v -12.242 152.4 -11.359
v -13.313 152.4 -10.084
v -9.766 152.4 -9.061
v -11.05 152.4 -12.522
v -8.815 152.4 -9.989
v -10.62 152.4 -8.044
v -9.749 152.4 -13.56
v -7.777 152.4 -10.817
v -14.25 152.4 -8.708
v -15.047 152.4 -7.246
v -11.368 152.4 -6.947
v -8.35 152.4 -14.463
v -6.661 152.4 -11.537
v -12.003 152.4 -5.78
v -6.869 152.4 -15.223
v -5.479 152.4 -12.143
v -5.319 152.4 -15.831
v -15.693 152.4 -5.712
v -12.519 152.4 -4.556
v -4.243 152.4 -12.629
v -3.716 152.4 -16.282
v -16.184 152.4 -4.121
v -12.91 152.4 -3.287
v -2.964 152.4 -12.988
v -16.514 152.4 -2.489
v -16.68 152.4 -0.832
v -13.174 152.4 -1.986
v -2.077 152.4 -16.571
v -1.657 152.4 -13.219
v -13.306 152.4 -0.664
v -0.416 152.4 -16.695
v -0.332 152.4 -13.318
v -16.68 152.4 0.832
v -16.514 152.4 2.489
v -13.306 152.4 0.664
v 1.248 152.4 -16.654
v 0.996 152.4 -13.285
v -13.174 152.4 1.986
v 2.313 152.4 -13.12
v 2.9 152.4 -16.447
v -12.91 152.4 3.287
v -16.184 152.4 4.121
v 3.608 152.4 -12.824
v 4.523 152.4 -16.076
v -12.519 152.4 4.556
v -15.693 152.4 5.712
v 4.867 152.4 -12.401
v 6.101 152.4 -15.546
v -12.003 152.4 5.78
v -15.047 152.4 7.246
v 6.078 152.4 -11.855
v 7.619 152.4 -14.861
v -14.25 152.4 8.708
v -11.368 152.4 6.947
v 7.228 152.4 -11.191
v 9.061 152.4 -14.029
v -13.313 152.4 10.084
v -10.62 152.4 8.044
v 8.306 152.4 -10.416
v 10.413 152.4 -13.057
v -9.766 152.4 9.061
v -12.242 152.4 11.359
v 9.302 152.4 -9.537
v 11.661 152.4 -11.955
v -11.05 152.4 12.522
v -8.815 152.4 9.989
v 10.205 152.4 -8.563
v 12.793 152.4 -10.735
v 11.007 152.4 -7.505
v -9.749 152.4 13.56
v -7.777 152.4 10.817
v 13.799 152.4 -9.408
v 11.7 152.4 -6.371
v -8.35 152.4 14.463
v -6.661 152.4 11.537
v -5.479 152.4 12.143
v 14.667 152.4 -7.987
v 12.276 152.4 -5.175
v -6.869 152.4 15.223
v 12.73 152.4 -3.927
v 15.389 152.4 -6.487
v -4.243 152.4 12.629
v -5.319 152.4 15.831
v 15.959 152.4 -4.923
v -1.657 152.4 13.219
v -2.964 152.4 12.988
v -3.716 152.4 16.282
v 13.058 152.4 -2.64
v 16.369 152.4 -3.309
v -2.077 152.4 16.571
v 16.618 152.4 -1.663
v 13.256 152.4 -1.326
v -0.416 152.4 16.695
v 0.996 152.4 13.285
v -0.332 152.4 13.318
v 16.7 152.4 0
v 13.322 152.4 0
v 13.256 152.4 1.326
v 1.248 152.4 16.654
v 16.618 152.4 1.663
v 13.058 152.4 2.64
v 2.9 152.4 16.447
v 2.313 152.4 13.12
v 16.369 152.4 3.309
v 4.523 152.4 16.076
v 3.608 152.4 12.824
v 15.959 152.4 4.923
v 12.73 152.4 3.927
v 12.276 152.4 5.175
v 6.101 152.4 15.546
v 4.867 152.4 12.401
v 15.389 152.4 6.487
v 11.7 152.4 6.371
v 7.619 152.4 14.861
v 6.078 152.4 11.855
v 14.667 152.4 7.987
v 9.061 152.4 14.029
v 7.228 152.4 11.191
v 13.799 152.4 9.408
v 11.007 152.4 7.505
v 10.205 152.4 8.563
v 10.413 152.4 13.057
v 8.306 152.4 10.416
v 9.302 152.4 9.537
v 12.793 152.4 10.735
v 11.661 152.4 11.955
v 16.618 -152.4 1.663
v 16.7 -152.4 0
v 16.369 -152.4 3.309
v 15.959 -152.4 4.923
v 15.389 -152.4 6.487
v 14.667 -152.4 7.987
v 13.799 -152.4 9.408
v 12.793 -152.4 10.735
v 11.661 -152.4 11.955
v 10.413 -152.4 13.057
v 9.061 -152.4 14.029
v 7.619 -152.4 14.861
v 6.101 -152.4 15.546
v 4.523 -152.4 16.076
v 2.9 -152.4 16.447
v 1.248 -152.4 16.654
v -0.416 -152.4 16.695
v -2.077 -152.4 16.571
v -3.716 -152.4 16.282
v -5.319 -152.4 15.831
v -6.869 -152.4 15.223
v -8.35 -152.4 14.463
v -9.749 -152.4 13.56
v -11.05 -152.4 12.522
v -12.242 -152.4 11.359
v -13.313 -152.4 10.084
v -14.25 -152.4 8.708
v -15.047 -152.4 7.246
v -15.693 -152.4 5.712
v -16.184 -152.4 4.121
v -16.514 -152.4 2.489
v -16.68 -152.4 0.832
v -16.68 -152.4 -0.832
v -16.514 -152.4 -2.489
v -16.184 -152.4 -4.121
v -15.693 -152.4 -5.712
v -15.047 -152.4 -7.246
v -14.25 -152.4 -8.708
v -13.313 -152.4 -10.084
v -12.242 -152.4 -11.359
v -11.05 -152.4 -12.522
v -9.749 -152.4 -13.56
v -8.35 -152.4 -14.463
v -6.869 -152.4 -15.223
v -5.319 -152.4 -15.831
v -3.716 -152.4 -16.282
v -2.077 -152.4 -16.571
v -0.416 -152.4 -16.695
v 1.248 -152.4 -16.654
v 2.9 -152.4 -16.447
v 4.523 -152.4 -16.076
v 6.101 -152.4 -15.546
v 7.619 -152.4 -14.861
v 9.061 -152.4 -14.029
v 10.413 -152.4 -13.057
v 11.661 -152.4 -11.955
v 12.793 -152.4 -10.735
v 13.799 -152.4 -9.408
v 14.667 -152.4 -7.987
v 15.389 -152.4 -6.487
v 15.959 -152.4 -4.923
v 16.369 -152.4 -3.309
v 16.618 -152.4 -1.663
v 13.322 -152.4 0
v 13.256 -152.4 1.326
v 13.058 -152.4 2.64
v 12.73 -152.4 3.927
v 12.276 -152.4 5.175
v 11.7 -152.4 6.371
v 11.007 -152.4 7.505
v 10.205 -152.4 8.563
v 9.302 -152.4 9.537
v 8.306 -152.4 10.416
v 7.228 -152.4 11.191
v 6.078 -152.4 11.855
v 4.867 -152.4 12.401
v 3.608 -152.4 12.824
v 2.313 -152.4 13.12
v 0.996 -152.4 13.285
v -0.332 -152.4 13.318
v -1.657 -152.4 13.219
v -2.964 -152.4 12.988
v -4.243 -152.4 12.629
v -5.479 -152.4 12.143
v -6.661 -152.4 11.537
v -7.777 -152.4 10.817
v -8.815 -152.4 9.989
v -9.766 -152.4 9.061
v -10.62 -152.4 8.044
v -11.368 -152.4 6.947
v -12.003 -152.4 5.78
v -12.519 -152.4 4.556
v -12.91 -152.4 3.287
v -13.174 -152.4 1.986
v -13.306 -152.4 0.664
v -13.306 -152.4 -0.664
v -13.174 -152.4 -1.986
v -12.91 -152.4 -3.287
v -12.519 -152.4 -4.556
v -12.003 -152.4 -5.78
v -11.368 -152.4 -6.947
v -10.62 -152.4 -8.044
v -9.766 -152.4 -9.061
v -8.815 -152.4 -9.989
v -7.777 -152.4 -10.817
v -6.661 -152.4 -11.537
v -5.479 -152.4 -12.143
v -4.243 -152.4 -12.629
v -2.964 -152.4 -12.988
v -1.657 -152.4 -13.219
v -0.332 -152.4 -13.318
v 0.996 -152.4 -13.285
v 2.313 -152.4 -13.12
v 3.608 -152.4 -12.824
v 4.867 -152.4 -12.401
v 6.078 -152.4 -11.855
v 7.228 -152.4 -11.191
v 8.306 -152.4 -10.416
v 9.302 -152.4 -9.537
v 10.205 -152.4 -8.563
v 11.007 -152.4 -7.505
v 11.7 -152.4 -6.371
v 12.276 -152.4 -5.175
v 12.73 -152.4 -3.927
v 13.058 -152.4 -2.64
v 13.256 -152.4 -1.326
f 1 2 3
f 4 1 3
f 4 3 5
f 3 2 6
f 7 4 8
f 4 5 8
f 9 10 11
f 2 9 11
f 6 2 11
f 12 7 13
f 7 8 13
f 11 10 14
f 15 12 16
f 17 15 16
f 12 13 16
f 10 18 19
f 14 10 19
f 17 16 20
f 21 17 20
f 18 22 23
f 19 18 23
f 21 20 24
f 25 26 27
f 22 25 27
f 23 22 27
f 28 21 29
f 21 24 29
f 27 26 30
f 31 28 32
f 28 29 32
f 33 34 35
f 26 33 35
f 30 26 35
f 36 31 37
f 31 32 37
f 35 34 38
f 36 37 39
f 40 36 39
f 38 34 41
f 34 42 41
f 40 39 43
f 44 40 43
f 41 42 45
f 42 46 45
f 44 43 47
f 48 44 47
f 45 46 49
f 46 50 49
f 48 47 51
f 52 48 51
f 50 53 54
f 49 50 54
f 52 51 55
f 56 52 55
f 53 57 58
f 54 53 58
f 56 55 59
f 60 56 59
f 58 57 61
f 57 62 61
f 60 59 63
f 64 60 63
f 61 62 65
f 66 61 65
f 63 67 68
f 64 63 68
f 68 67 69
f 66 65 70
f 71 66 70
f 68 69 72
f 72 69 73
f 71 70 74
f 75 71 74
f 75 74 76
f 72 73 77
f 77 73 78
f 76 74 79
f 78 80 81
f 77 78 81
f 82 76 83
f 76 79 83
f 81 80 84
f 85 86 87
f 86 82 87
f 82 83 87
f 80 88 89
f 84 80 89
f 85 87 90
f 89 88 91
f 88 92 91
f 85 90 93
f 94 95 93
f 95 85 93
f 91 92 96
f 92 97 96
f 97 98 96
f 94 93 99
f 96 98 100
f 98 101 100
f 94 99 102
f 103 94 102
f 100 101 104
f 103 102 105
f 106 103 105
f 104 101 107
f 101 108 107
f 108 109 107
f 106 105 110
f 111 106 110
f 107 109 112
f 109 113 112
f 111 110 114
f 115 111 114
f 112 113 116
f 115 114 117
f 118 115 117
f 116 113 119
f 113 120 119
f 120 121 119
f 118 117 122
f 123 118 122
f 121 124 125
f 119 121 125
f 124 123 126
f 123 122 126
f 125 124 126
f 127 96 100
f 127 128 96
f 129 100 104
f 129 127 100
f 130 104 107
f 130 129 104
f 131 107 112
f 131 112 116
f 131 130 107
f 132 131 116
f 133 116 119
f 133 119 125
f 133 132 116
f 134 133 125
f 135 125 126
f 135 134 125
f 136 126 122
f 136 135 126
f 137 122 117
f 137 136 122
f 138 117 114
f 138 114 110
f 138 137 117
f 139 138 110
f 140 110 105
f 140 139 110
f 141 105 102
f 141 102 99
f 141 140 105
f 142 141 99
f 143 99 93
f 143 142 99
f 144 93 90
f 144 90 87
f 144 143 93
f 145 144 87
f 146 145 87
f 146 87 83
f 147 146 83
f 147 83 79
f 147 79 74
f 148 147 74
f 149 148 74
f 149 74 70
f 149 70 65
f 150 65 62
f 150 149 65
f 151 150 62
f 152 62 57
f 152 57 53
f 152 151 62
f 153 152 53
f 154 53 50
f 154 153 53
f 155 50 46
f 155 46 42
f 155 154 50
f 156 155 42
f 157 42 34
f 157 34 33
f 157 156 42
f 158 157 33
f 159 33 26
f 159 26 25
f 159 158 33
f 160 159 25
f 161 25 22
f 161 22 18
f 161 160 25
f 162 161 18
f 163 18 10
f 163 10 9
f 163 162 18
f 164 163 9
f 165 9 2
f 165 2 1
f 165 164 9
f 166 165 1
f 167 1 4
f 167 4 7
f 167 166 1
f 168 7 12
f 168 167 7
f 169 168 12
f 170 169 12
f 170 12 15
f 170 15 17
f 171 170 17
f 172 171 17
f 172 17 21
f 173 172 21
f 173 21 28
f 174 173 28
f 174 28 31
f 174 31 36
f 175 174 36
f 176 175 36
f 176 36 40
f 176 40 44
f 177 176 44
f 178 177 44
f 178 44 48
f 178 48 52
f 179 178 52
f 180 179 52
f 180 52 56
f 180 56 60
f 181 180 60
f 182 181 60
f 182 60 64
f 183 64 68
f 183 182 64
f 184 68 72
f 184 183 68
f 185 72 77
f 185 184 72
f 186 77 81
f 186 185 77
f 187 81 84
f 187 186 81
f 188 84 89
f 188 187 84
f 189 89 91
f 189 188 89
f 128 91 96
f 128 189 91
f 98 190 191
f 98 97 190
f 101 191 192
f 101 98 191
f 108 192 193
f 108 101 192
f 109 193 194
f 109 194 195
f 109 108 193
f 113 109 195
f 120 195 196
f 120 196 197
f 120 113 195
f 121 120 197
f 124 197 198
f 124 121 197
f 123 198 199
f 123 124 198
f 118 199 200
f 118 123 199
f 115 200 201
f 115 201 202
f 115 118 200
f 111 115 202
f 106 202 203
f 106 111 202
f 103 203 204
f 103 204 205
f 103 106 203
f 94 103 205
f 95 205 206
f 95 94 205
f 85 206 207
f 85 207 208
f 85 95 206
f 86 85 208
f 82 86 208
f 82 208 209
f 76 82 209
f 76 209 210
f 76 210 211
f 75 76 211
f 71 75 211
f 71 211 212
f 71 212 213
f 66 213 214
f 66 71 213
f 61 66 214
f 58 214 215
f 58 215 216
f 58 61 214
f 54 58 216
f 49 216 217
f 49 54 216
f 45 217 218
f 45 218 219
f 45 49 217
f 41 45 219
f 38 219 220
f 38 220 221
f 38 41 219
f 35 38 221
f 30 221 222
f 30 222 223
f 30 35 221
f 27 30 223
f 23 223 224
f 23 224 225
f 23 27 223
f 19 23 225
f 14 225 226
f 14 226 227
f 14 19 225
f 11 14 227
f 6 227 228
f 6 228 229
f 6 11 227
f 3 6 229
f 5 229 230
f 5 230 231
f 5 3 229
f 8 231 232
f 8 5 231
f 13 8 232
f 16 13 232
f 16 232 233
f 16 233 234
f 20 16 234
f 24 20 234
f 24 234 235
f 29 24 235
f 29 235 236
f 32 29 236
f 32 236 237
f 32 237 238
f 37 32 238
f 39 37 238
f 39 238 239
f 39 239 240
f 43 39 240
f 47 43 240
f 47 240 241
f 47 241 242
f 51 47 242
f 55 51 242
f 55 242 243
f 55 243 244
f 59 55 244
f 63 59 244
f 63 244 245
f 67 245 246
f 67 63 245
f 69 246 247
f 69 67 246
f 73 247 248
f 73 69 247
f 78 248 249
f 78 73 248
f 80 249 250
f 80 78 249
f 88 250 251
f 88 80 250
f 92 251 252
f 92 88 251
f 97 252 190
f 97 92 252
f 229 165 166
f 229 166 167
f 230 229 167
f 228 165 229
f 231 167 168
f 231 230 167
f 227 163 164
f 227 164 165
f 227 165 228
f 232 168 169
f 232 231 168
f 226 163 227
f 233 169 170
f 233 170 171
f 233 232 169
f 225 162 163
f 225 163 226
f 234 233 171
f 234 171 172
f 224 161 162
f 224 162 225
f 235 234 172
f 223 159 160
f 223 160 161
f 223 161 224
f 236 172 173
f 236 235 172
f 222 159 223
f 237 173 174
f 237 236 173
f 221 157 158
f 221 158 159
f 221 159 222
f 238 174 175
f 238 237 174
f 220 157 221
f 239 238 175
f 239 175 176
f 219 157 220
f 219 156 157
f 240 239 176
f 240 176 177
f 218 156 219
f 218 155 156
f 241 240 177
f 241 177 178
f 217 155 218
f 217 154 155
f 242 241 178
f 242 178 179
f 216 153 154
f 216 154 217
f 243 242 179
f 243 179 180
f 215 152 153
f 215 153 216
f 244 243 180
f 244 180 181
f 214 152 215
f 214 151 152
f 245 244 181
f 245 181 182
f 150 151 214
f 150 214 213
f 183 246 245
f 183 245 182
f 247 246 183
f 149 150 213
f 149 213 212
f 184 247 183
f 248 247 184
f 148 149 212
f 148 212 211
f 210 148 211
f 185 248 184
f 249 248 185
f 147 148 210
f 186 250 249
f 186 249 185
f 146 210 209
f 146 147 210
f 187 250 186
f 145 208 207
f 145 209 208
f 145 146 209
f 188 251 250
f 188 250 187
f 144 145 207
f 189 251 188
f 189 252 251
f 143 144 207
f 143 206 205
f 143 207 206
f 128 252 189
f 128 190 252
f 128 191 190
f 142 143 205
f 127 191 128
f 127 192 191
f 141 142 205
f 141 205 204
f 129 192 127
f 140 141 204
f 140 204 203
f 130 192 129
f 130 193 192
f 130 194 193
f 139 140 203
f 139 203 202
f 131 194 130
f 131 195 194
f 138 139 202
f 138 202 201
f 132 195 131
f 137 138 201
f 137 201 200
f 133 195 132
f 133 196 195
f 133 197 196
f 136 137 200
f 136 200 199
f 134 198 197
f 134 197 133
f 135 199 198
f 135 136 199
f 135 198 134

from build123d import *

# Parameters (mm, degrees)
F0_R     = 16.7005
F0_R_2   = 13.3223
F1_DEPTH = 152.4
F3_R     = 28.470245
F4_DEPTH = 25.4


with BuildPart() as f1:
    # F0 (on Front) → F1 (new body, symmetric)
    with BuildSketch(Plane.XZ):
        Circle(F0_R)
        Circle(F0_R_2, mode=Mode.SUBTRACT)
    extrude(amount=F1_DEPTH, both=True)


with BuildPart() as f4:
    # F3 (on Right) → F4 (new body)
    with BuildSketch(Plane.YZ):
        with Locations((44.697168, 50.904491)):
            Circle(F3_R)
    extrude(amount=F4_DEPTH)


solid = f1.part
